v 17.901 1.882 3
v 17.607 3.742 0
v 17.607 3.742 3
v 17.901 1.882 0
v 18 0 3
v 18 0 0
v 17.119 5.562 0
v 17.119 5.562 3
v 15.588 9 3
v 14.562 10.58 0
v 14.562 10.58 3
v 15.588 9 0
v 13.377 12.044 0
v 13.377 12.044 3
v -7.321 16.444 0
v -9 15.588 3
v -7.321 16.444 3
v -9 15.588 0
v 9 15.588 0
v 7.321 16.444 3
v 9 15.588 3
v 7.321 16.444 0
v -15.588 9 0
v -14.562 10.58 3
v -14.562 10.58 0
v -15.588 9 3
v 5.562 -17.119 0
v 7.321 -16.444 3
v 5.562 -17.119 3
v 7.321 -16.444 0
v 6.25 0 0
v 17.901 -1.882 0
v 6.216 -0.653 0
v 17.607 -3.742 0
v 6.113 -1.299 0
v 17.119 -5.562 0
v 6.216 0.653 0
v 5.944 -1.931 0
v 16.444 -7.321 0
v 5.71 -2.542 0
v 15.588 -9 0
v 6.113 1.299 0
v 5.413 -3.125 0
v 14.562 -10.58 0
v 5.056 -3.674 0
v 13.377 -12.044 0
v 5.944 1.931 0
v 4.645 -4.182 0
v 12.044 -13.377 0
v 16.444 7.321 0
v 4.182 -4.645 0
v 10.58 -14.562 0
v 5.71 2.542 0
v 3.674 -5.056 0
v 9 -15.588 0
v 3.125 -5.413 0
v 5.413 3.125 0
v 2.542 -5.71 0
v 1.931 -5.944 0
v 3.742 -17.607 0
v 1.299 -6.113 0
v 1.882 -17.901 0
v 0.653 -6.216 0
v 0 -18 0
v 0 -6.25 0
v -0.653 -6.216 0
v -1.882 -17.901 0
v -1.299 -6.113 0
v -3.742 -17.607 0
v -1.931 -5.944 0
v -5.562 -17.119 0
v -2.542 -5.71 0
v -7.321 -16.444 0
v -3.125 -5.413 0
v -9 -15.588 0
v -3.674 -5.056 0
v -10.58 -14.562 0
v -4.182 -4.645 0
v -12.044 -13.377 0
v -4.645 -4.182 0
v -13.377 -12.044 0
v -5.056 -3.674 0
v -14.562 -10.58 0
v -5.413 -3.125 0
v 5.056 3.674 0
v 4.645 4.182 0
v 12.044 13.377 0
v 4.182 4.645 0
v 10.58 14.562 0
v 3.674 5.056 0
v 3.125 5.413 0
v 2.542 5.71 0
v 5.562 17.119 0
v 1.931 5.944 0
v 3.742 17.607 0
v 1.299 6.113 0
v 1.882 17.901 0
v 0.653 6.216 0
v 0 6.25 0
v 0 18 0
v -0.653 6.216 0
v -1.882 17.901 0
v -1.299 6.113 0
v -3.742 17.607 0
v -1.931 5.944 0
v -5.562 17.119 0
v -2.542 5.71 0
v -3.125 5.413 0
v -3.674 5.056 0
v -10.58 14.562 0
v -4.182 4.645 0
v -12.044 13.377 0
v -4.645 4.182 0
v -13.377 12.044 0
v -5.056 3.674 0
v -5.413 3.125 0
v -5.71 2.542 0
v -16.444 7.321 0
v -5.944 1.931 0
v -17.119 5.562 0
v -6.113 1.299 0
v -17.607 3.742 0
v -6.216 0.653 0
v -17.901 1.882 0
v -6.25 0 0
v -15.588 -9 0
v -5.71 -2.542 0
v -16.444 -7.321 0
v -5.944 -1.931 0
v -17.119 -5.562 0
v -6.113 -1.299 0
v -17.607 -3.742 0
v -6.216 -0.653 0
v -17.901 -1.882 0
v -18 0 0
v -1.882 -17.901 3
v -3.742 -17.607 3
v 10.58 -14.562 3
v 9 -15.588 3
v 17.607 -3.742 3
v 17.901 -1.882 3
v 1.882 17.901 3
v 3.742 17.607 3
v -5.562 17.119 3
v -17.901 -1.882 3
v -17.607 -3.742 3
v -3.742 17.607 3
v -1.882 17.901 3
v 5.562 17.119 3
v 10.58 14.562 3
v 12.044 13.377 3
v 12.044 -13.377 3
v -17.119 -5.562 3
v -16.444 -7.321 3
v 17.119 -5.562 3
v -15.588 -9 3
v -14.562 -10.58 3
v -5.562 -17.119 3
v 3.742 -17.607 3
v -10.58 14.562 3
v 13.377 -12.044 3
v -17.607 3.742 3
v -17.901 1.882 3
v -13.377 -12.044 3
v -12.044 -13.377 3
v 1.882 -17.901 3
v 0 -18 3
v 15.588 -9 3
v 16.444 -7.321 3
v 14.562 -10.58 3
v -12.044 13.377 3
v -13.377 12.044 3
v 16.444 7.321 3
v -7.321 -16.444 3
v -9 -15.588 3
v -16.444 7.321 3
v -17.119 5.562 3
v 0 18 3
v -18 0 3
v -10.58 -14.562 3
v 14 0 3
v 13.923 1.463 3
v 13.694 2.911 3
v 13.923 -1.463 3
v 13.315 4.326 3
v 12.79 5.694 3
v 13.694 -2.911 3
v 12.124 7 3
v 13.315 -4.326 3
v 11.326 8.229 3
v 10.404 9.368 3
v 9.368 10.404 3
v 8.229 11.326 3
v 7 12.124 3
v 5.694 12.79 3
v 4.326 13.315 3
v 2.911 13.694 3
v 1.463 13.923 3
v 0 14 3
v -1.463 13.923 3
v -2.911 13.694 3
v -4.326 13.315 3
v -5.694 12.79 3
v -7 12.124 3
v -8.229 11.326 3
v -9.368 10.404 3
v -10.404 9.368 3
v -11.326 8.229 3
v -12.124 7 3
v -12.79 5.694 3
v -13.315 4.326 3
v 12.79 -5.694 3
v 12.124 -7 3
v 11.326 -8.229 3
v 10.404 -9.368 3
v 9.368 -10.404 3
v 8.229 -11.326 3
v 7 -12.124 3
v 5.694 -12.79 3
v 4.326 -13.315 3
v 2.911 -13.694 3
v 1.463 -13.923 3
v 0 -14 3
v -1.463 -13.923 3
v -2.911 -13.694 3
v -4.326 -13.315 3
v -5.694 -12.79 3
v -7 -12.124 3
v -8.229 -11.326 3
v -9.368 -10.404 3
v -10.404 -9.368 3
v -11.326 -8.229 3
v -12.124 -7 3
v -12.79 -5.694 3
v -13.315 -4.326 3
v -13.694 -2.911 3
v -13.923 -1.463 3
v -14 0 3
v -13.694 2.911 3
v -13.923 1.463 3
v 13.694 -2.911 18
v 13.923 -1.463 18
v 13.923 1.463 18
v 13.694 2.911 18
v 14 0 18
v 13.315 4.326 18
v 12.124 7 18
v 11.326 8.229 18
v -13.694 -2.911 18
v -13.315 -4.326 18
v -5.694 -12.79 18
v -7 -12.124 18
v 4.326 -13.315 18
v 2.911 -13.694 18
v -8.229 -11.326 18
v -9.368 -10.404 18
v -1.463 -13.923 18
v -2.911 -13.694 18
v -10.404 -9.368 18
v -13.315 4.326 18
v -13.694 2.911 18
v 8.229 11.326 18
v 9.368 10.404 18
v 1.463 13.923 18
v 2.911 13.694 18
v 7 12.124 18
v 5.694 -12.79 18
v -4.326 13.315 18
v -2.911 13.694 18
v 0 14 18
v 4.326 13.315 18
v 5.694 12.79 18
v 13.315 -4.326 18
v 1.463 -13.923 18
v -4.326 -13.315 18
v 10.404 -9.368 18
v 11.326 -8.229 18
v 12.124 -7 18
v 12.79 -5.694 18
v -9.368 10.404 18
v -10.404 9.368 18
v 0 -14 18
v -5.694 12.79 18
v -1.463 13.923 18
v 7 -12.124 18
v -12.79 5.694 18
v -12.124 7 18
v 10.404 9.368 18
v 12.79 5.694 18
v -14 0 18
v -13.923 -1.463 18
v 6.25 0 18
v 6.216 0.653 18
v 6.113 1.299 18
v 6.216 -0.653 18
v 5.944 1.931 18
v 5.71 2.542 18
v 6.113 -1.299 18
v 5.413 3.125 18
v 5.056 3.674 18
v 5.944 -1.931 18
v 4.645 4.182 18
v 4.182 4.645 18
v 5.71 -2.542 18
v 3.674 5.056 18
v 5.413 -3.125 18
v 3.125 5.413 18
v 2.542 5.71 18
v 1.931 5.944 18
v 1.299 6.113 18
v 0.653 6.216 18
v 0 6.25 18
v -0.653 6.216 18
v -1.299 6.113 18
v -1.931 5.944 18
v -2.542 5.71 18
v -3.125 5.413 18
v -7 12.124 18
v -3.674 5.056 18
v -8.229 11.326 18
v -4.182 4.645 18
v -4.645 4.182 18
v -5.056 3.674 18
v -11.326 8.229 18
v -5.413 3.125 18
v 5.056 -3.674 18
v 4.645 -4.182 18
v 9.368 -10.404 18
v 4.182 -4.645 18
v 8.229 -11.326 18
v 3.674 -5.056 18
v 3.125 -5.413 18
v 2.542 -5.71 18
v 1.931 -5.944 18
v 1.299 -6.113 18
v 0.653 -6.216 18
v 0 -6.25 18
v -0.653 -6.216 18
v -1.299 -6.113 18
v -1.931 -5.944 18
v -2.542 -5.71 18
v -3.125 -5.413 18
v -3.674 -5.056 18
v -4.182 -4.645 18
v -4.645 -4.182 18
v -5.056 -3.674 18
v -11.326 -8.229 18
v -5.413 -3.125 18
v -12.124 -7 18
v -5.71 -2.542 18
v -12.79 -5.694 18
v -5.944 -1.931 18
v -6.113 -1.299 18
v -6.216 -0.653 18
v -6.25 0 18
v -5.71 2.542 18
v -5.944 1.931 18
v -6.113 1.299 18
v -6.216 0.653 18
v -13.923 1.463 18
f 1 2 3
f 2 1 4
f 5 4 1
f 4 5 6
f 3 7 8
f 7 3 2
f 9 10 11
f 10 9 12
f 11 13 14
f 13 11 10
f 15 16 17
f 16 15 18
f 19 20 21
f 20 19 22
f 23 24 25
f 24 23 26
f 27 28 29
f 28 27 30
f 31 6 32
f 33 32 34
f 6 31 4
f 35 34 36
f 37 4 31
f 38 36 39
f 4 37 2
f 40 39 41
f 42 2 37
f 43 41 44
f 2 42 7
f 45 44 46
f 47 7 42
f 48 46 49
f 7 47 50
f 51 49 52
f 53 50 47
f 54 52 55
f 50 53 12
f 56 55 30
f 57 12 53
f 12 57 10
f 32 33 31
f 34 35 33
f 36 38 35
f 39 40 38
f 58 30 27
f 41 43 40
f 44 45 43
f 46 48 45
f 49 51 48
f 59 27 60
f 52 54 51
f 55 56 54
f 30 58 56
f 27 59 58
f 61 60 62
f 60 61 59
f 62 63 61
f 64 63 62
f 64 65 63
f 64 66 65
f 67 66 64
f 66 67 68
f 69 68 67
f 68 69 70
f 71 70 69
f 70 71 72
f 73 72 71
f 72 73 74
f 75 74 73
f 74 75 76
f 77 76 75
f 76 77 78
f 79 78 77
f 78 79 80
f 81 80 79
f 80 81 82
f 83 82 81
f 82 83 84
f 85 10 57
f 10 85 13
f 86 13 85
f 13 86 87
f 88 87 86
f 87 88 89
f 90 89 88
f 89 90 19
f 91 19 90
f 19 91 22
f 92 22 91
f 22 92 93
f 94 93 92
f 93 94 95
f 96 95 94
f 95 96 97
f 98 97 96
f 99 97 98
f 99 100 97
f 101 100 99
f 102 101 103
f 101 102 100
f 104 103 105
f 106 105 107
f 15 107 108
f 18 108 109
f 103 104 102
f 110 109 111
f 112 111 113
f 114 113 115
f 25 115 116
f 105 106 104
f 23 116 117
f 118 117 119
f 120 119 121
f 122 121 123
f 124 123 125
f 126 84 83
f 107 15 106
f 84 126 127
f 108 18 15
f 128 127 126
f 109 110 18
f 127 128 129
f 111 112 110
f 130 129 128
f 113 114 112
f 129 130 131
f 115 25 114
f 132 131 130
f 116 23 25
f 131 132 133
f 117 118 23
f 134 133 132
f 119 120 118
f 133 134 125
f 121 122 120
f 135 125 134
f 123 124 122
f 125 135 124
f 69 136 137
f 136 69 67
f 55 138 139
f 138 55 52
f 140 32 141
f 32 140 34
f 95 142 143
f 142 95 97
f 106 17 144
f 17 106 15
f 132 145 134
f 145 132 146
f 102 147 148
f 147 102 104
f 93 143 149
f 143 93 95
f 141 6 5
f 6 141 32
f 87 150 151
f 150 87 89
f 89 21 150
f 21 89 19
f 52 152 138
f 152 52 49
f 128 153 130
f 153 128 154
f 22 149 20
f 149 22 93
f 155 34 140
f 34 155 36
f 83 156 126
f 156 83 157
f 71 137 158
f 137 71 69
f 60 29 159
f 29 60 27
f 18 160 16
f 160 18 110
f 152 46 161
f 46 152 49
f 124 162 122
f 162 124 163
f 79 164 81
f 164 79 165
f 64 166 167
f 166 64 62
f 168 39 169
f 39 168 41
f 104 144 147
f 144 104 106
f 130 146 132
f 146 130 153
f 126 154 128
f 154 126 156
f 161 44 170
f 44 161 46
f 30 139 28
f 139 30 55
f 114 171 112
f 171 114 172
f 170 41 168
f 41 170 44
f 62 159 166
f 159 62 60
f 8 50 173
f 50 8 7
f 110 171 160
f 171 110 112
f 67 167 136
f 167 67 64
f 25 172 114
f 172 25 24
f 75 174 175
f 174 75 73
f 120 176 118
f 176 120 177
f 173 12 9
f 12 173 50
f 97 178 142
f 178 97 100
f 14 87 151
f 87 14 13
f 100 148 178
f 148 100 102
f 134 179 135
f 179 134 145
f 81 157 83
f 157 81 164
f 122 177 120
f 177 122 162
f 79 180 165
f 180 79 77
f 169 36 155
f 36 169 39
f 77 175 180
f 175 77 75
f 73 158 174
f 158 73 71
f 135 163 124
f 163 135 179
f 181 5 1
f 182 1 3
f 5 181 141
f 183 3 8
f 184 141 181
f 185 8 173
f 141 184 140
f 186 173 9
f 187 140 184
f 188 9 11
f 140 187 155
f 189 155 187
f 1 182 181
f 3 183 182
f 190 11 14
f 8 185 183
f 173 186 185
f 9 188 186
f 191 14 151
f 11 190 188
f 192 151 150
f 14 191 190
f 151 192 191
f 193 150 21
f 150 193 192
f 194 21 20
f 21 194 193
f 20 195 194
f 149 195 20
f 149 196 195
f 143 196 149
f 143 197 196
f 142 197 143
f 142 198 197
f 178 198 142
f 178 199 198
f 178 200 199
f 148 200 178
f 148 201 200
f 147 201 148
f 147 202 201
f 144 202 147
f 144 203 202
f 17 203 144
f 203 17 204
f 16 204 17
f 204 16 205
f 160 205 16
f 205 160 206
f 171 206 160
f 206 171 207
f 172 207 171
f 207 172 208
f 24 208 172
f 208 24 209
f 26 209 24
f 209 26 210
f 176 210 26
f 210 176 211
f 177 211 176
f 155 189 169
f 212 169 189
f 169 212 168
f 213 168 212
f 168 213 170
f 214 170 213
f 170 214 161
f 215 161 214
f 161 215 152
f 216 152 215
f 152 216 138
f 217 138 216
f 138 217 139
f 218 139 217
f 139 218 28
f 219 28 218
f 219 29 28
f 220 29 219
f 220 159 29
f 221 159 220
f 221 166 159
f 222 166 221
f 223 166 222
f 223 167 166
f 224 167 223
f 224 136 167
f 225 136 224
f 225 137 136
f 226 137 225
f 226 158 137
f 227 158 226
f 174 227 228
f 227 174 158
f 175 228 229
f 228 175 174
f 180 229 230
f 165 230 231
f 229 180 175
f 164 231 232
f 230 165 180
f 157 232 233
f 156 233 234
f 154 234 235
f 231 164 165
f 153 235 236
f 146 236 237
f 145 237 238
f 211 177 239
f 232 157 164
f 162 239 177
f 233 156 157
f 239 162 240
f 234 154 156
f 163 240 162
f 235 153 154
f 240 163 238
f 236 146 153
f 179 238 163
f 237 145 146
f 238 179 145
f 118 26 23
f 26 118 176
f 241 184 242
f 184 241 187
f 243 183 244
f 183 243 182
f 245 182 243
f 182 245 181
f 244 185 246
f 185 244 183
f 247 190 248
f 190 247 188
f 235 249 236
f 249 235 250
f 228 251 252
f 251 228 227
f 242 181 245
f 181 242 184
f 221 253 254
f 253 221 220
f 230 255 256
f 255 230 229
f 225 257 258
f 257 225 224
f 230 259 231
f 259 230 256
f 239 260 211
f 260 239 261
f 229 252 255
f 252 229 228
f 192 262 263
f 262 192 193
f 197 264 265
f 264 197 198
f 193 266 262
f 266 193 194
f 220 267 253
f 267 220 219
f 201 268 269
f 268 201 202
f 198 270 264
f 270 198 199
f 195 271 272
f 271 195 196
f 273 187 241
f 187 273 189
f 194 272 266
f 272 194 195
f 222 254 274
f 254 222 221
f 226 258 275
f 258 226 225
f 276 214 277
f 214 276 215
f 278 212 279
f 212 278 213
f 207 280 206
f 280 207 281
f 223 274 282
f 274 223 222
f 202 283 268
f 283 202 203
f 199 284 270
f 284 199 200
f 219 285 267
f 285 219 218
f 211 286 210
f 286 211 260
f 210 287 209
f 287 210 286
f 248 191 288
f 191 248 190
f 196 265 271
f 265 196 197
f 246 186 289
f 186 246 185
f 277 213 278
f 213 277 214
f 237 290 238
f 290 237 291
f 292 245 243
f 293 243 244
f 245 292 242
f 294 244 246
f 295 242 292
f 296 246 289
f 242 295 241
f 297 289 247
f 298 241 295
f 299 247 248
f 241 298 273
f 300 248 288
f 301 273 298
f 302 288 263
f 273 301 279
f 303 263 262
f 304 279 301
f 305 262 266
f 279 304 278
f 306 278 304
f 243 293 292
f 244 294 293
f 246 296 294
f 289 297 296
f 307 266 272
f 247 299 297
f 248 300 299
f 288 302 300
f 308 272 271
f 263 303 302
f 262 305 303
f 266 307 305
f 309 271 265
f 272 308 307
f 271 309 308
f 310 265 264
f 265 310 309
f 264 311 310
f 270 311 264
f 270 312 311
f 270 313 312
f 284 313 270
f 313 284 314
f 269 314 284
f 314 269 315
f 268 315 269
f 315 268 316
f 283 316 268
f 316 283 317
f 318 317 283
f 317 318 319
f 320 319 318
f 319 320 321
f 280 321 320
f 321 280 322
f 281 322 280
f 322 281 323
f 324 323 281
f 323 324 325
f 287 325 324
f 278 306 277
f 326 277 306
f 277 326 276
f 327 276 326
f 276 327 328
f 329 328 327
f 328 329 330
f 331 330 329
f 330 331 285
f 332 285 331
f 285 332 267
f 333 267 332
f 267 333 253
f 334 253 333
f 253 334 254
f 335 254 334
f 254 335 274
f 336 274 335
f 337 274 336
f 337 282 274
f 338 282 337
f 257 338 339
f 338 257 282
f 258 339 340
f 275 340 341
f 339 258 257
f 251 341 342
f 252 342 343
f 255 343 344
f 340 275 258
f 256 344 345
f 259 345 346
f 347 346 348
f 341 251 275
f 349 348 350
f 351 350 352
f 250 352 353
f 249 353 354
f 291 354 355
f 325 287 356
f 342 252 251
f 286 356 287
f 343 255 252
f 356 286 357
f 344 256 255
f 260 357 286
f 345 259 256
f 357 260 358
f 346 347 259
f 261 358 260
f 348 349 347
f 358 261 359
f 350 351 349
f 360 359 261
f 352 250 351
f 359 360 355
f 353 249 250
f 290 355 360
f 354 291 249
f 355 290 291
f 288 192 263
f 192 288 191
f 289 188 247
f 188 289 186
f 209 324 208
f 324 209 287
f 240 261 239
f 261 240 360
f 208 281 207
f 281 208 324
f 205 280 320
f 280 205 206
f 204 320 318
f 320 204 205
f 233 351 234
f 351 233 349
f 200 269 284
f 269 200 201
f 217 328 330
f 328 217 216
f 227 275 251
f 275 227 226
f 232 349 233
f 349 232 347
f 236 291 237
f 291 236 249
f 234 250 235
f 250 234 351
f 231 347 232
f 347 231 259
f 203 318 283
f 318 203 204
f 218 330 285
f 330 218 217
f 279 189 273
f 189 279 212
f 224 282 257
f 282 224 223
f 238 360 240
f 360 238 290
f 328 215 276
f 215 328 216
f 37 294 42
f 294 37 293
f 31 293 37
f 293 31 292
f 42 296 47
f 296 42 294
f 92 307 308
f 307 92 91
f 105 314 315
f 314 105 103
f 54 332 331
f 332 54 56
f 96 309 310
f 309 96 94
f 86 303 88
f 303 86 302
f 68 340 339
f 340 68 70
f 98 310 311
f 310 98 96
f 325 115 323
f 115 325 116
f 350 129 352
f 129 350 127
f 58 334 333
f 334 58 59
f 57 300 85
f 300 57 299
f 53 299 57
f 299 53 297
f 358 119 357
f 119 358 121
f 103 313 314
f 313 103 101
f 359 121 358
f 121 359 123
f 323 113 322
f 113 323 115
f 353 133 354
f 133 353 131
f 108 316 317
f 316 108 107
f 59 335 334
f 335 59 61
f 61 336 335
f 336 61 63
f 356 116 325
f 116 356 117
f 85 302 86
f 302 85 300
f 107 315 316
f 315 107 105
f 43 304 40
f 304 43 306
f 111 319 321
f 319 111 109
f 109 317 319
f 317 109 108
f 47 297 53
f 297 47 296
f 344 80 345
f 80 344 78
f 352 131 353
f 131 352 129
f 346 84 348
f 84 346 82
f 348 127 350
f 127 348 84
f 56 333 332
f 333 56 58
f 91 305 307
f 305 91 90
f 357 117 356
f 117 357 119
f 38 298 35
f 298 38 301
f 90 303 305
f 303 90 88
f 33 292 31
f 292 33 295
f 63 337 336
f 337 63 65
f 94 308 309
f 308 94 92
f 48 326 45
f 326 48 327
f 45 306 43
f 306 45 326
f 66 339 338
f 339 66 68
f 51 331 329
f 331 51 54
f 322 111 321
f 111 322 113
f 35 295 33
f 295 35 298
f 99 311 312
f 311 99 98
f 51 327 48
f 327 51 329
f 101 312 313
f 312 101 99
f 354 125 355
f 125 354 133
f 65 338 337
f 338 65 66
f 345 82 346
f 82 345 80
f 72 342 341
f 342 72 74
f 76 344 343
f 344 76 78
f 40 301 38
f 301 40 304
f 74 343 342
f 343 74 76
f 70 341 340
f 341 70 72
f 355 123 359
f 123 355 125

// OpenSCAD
// Cable gland body for 12 mm cable.
$fn = 60;
eps = 0.02;
cable_d = 12;
body_d = 28;
body_l = 18;
flange_d = body_d + 8;
flange_t = 3;
difference() {
    union() { cylinder(d = flange_d, h = flange_t); cylinder(d = body_d, h = body_l); }
    translate([0, 0, -eps]) cylinder(d = cable_d + 0.5, h = body_l + 2 * eps);
}
